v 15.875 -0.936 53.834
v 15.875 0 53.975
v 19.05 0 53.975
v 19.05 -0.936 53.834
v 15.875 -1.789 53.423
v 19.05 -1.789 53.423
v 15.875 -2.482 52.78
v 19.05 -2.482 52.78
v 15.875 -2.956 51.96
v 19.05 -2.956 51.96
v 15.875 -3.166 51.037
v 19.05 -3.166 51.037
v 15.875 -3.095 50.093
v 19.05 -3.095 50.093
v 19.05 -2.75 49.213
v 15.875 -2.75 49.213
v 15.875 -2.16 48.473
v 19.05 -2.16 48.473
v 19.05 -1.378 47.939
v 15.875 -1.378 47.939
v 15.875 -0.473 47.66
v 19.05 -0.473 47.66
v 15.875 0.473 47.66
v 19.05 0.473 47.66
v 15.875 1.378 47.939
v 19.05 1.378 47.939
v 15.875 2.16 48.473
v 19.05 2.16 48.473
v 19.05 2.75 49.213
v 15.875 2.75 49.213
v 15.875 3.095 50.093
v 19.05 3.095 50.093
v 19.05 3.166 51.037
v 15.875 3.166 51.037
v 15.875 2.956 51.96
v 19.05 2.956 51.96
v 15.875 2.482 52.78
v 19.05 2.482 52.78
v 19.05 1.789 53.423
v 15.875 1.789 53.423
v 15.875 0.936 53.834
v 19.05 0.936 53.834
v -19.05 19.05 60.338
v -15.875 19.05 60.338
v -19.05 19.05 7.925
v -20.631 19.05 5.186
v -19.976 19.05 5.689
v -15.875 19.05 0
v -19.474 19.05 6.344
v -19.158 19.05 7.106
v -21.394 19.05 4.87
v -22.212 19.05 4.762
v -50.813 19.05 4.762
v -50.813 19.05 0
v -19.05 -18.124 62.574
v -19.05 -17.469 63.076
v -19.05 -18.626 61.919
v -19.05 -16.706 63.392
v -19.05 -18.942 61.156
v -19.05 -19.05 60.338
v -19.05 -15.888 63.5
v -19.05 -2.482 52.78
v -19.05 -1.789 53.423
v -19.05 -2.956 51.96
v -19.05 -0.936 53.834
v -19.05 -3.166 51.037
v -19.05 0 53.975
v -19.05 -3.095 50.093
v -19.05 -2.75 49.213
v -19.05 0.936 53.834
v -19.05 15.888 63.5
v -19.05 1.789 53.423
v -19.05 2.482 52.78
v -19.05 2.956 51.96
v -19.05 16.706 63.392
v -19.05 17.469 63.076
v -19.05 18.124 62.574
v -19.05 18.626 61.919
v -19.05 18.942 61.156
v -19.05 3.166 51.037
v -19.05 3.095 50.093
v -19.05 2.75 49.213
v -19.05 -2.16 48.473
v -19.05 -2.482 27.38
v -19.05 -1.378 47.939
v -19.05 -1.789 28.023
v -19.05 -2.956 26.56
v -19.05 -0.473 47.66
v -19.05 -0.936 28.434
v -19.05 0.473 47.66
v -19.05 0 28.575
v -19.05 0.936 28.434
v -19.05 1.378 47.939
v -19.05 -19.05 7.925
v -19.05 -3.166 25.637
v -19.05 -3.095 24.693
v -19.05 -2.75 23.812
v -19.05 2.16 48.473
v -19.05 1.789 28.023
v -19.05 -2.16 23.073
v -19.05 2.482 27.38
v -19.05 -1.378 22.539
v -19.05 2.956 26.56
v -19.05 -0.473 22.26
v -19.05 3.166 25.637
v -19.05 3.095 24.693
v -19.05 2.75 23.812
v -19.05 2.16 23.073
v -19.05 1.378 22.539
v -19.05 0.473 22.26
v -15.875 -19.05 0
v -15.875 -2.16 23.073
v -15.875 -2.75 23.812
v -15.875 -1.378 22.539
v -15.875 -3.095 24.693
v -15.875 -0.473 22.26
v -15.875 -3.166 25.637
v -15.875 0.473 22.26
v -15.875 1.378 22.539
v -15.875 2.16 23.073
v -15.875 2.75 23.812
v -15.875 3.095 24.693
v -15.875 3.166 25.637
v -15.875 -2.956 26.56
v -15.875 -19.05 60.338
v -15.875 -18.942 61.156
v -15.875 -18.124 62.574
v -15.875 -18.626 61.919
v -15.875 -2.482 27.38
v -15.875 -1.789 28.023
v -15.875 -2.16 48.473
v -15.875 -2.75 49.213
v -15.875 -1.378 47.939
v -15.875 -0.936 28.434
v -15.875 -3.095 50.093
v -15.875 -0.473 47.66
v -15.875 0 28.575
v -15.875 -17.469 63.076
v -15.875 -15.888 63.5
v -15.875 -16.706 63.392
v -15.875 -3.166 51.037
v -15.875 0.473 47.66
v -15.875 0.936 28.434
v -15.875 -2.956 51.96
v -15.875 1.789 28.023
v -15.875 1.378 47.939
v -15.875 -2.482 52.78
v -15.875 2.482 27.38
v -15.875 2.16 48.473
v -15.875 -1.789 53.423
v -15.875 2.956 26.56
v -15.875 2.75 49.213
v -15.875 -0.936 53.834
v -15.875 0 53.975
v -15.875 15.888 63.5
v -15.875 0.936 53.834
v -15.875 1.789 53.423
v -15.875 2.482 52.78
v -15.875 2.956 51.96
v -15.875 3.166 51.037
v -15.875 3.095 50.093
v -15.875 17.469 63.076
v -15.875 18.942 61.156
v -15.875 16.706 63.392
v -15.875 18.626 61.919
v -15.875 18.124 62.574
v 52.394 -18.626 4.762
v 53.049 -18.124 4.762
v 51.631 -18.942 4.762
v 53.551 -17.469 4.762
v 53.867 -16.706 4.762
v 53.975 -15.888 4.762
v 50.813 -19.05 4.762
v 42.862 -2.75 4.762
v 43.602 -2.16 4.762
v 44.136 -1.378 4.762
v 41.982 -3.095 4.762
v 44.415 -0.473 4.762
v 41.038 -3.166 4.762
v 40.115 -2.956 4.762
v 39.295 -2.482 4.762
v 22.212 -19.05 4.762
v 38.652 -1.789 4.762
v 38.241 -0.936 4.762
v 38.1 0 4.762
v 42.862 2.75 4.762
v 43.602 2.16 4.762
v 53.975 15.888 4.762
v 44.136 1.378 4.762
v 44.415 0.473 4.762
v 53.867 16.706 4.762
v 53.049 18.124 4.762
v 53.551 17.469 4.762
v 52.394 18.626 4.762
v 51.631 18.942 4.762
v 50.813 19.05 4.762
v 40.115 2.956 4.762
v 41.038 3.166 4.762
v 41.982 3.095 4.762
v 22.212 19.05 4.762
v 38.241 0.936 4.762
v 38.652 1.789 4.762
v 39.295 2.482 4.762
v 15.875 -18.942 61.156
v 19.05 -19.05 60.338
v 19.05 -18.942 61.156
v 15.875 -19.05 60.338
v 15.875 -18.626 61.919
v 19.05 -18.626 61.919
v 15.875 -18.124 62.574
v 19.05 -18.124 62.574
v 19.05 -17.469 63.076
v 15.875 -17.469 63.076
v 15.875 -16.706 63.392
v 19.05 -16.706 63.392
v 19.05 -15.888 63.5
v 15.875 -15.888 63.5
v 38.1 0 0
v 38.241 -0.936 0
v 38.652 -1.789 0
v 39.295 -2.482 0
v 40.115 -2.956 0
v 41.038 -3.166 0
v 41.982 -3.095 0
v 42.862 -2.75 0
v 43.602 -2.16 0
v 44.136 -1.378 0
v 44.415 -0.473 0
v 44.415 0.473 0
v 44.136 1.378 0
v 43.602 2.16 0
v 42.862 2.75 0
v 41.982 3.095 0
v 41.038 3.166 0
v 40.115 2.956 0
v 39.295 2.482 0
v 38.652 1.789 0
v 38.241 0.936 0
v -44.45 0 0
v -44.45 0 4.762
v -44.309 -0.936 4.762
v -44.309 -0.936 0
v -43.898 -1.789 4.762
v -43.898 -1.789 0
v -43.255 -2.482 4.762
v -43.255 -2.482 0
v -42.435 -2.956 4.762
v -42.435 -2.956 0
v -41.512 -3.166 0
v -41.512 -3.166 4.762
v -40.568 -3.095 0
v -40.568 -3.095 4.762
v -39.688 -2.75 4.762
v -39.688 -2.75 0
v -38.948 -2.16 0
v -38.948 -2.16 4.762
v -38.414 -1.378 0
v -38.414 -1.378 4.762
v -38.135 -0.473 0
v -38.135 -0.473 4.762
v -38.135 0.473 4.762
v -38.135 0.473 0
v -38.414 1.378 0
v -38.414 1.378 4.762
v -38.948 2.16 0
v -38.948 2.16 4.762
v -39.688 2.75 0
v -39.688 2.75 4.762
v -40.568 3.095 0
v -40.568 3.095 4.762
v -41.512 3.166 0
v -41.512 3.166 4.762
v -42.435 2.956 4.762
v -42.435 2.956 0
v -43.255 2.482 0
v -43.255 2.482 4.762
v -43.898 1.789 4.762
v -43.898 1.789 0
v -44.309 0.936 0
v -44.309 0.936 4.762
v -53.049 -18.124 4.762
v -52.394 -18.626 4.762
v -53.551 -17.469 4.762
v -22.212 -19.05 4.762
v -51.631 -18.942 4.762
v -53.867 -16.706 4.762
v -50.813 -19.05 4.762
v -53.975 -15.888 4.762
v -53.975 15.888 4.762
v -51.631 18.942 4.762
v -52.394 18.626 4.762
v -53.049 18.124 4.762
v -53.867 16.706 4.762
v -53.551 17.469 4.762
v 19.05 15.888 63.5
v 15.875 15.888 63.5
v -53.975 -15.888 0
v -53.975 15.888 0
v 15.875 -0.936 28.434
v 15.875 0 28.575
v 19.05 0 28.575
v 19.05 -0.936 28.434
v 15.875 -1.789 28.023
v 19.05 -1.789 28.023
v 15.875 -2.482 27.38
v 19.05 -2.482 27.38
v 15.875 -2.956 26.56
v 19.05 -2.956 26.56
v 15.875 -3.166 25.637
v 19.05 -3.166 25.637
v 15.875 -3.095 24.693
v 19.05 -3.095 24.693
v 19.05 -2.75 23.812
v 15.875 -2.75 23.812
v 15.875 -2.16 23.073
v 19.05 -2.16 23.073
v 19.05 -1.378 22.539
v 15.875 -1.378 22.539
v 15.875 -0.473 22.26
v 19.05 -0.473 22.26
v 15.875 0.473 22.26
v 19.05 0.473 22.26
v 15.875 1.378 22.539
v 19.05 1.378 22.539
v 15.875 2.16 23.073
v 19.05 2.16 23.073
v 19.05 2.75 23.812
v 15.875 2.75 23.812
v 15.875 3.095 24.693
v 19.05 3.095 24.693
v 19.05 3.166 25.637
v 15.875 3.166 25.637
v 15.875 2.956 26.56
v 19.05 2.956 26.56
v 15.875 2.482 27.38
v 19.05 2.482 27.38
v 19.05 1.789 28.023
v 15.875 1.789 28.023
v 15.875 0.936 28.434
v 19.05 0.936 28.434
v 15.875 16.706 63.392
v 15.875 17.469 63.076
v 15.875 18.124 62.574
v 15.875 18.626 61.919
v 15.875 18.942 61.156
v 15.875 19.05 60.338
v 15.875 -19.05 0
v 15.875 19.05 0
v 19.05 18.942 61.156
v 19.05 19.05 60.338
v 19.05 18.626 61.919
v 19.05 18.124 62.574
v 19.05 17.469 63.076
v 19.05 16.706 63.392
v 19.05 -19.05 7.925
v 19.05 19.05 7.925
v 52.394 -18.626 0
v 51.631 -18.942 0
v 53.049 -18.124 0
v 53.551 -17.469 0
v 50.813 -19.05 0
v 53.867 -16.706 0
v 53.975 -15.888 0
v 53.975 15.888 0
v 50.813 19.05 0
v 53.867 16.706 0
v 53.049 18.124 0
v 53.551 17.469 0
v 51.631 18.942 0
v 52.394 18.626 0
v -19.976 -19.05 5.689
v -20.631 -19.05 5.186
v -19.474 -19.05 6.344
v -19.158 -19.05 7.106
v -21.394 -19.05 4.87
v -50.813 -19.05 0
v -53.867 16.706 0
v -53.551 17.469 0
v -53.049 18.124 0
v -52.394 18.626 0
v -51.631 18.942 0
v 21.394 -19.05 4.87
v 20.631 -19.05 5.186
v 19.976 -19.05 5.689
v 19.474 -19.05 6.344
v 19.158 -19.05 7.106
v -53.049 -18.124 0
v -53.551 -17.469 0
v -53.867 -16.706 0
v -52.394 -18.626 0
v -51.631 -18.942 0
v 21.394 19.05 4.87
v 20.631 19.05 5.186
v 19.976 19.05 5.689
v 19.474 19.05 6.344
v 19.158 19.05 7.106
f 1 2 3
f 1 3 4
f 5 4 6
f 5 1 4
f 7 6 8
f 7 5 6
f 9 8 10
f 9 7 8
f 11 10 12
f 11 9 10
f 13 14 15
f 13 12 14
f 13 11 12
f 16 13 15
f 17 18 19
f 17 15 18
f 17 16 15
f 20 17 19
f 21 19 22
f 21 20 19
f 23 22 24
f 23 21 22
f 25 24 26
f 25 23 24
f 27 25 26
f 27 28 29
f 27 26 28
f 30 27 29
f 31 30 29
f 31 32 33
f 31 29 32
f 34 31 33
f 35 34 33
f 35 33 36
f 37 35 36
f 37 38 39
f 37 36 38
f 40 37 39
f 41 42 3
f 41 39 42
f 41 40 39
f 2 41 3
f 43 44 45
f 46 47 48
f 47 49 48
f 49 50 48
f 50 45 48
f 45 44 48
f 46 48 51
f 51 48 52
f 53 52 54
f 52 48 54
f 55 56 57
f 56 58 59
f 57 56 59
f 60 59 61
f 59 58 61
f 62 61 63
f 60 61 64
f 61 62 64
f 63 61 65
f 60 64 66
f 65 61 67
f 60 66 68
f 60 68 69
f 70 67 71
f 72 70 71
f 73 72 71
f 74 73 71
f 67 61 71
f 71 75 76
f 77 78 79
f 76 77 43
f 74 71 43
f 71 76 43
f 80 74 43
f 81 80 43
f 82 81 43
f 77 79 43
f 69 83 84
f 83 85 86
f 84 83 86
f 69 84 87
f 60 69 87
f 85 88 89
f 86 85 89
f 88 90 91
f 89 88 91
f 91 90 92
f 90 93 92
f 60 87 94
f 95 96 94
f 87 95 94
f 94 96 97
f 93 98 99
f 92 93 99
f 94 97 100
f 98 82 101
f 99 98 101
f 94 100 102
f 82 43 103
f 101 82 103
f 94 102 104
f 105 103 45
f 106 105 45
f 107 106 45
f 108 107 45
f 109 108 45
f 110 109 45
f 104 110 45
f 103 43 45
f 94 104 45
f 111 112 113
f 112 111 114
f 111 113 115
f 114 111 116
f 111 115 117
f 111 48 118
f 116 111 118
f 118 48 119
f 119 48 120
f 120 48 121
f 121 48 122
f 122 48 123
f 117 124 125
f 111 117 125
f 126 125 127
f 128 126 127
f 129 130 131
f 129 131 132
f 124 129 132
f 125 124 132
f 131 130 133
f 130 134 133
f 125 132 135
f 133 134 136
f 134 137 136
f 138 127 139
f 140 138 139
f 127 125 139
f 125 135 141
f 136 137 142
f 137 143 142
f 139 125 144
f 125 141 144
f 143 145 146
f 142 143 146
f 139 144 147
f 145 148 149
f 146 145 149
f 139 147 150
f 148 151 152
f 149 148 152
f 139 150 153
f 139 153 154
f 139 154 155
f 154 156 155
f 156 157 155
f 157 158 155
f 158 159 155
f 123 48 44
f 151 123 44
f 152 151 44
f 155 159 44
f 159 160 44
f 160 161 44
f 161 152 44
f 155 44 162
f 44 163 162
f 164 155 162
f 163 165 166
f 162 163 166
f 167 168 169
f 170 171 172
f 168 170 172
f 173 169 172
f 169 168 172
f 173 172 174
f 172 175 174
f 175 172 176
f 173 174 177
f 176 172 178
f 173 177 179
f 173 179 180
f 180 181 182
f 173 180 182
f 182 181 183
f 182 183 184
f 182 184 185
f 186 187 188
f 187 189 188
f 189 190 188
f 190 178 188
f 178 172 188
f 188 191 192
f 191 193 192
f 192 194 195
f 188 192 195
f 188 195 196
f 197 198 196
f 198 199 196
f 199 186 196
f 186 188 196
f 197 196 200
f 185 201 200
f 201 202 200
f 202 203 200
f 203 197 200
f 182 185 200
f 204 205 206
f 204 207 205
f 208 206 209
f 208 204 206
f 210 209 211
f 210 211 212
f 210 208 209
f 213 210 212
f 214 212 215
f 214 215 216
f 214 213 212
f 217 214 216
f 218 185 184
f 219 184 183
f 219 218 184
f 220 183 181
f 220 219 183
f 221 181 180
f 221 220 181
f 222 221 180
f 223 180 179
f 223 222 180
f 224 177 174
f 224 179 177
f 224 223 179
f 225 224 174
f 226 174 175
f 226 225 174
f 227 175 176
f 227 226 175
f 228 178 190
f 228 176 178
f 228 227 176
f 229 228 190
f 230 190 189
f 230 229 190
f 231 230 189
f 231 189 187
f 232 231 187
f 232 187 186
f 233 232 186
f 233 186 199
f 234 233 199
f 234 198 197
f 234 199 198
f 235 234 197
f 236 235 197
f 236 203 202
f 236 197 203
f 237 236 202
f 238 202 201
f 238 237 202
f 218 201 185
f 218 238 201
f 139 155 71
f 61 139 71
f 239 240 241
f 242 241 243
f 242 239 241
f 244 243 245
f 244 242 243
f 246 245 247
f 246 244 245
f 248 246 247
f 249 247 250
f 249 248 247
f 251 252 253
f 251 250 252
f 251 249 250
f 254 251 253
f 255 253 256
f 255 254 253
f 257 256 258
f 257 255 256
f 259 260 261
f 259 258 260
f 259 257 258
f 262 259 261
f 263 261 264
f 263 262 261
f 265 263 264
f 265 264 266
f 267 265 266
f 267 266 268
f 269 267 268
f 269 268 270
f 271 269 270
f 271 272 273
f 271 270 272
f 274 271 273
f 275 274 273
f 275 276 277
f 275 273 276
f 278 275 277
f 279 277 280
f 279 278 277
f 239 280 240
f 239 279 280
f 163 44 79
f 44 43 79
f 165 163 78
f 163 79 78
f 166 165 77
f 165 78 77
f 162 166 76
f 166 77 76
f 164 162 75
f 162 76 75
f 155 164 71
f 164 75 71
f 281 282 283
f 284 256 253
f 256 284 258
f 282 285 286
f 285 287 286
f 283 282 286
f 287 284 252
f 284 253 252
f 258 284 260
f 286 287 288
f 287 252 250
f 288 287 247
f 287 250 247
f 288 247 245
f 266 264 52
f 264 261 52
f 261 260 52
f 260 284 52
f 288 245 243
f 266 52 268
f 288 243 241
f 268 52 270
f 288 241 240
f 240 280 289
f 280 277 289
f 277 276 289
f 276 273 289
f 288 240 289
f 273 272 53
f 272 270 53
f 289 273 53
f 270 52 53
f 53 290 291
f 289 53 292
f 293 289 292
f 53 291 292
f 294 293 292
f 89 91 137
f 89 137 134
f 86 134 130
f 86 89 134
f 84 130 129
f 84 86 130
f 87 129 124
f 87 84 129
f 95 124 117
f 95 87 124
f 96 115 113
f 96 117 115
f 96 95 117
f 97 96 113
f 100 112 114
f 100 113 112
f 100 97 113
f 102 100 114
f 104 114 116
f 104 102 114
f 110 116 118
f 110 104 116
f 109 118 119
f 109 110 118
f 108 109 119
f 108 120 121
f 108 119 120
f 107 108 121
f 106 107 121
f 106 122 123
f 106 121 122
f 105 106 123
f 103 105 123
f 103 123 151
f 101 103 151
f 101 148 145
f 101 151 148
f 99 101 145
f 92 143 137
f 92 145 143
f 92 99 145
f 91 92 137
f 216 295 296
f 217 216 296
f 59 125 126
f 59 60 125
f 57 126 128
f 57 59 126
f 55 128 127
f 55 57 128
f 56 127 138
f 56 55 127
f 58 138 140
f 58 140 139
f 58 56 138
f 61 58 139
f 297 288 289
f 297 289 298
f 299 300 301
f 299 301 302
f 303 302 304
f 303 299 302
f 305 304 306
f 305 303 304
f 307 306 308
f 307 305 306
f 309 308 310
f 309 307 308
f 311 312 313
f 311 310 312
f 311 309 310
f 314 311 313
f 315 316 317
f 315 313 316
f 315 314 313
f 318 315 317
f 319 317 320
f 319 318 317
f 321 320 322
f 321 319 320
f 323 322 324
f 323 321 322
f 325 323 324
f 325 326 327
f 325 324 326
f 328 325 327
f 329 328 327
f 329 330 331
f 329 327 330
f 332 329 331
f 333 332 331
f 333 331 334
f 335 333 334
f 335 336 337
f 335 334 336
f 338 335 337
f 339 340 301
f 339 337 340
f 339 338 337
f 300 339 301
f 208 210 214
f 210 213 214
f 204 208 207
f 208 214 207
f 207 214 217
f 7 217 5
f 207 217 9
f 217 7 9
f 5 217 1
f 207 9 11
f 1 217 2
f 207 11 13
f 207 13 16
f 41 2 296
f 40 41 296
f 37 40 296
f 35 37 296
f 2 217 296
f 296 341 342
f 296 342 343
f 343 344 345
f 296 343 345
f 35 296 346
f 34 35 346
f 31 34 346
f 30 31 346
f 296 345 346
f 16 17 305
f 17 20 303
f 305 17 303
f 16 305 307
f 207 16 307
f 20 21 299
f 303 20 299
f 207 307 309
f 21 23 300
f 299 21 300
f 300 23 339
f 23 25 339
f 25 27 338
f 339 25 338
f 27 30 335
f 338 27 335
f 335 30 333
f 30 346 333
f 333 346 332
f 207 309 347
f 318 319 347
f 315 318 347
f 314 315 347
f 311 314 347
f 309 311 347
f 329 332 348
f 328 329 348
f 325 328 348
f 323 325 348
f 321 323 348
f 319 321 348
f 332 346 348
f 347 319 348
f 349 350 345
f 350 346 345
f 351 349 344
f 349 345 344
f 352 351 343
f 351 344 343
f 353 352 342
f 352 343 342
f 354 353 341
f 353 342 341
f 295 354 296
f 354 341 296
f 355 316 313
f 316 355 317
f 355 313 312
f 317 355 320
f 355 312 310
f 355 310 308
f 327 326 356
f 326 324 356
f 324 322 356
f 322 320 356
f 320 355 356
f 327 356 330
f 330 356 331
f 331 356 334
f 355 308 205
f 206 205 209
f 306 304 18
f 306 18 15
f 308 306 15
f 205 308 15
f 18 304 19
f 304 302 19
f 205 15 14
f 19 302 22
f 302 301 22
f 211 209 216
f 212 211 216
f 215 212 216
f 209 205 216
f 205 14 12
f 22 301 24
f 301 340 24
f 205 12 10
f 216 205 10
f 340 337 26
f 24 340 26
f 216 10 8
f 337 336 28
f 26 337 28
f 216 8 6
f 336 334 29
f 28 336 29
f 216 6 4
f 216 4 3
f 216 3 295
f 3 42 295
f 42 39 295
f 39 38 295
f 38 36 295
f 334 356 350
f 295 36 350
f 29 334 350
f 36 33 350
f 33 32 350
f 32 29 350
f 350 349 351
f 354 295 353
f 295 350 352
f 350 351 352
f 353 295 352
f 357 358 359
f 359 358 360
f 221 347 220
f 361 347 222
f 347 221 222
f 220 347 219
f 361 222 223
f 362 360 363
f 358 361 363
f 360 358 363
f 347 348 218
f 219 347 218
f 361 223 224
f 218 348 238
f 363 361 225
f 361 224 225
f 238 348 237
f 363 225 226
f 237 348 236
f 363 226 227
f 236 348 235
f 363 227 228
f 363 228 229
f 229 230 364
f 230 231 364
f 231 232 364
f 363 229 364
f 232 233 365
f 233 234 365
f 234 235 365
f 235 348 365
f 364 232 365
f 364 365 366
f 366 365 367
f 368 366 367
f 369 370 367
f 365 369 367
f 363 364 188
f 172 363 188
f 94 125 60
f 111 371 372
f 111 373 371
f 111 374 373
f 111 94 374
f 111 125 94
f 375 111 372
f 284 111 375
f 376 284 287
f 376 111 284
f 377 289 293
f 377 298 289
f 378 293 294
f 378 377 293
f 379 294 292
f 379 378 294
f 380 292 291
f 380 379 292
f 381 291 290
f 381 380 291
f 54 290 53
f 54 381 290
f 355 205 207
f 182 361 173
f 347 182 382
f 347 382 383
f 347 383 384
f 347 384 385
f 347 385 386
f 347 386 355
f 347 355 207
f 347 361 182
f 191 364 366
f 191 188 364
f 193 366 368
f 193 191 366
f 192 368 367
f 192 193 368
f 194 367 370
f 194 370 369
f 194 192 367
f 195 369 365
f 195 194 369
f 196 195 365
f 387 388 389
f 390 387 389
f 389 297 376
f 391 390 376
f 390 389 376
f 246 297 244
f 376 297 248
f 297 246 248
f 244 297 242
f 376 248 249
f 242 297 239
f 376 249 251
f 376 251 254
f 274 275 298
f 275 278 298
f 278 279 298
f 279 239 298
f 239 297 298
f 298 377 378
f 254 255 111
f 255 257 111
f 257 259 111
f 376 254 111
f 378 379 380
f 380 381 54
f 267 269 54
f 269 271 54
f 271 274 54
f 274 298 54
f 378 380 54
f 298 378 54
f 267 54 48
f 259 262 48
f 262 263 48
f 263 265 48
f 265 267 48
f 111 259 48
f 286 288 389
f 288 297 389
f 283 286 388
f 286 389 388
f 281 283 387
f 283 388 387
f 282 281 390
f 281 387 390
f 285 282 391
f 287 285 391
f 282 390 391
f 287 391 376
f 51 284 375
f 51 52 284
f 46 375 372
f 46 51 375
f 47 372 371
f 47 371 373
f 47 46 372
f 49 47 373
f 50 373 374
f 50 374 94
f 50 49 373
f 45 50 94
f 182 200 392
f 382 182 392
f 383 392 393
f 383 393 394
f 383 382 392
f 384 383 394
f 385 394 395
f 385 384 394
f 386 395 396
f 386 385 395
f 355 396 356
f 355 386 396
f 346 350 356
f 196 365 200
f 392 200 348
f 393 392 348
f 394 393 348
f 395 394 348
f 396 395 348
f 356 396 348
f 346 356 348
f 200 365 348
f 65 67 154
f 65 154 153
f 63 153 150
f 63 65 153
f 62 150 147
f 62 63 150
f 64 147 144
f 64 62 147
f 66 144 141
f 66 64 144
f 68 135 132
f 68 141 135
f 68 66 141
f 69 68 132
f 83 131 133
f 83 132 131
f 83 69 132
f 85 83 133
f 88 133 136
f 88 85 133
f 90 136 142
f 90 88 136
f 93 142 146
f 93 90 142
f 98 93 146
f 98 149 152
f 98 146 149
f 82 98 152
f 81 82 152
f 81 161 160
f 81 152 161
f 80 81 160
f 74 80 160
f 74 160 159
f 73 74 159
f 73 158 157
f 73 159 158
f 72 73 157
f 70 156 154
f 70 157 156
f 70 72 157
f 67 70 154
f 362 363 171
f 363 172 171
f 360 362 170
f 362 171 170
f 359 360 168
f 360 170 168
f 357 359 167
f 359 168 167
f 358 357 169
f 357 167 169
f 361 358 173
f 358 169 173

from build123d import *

# Parameters (mm, degrees)
BOSS_EXTRUDE2_DEPTH   = 19.05
BOSS_EXTRUDE2_2_DEPTH = 19.05
SKETCH2_R             = 3.175
EXTRUDE2_DEPTH        = 86.489491313
EXTRUDE3_DEPTH        = 86.988181903
EXTRUDE3_DEPTH_BACK   = 86.988181903
SKETCH3_R             = 3.175
FILLET3_R             = 3.1623
FILLET4_R             = 3.1623


with BuildPart() as part:
    # Sketch1 → Boss-Extrude2 (new, symmetric)
    with BuildSketch(Plane(origin=(0, 0, 0), x_dir=(1, 0, 0), z_dir=(0, 1, 0))):
        Polygon((-53.975, 0), (-15.875, 0), (-15.875, -63.5), (-19.05, -63.5), (-19.05, -4.7625), (-53.975, -4.7625), align=None)
    extrude(amount=BOSS_EXTRUDE2_DEPTH, both=True)


with BuildPart() as body_2:
    # Sketch1 → Boss-Extrude2 2 (new, symmetric)
    with BuildSketch(Plane(origin=(0, 0, 0), x_dir=(1, 0, 0), z_dir=(0, 1, 0))):
        Polygon((53.975, 0), (53.975, -4.7625), (19.05, -4.7625), (19.05, -63.5), (15.875, -63.5), (15.875, 0), align=None)
    extrude(amount=BOSS_EXTRUDE2_2_DEPTH, both=True)


with BuildPart() as extrude2_tool:
    # Sketch2 → Extrude2 (new, through all)
    with BuildSketch(Plane.XY):
        with Locations(Location((-41.275, 0, 0), (0, 0, 180))):
            Circle(SKETCH2_R)
        with Locations(Location((41.275, 0, 0), (0, 0, 180))):
            Circle(SKETCH2_R)
    extrude(amount=EXTRUDE2_DEPTH)


with BuildPart() as part_1:
    add(part.part)

    # Extrude2: cut by extrude2_tool
    add(extrude2_tool.part, mode=Mode.SUBTRACT)


with BuildPart() as body_2_1:
    add(body_2.part)

    # Extrude2: cut by extrude2_tool
    add(extrude2_tool.part, mode=Mode.SUBTRACT)


with BuildPart() as extrude3_tool:
    # Sketch3 → Extrude3 (new, two sides: drawn at the far end of the back side and taken through both)
    with BuildSketch(Plane(origin=(0, 0, -0.669808337), x_dir=(0, 0, -1), z_dir=(1, 0, 0)).offset(-EXTRUDE3_DEPTH_BACK)):
        with Locations(Location((-51.469808337, 0, 0), (0, 0, 180))):
            Circle(SKETCH3_R)
        with Locations(Location((-26.069808337, 0, 0), (0, 0, 180))):
            Circle(SKETCH3_R)
    extrude(amount=EXTRUDE3_DEPTH + EXTRUDE3_DEPTH_BACK)


with BuildPart() as part_2:
    add(part_1.part)

    # Extrude3: cut by extrude3_tool
    add(extrude3_tool.part, mode=Mode.SUBTRACT)

    # Fillet4
    fillet4_edges = [part_2.edges().sort_by_distance(p)[0] for p in [
        (-53.975, 19.05, 2.38125),
        (-19.05, 0, 4.7625),
        (-17.4625, 19.05, 63.5),
        (-17.4625, -19.05, 63.5),
        (-53.975, -19.05, 2.38125),
    ]]
    fillet(fillet4_edges, radius=FILLET4_R)


with BuildPart() as body_2_2:
    add(body_2_1.part)

    # Extrude3: cut by extrude3_tool
    add(extrude3_tool.part, mode=Mode.SUBTRACT)

    # Fillet3
    fillet3_edges = [body_2_2.edges().sort_by_distance(p)[0] for p in [
        (17.4625, 19.05, 63.5),
        (19.05, 0, 4.7625),
        (53.975, 19.05, 2.38125),
        (53.975, -19.05, 2.38125),
        (17.4625, -19.05, 63.5),
    ]]
    fillet(fillet3_edges, radius=FILLET3_R)


solid = Compound([part_2.part, body_2_2.part])
